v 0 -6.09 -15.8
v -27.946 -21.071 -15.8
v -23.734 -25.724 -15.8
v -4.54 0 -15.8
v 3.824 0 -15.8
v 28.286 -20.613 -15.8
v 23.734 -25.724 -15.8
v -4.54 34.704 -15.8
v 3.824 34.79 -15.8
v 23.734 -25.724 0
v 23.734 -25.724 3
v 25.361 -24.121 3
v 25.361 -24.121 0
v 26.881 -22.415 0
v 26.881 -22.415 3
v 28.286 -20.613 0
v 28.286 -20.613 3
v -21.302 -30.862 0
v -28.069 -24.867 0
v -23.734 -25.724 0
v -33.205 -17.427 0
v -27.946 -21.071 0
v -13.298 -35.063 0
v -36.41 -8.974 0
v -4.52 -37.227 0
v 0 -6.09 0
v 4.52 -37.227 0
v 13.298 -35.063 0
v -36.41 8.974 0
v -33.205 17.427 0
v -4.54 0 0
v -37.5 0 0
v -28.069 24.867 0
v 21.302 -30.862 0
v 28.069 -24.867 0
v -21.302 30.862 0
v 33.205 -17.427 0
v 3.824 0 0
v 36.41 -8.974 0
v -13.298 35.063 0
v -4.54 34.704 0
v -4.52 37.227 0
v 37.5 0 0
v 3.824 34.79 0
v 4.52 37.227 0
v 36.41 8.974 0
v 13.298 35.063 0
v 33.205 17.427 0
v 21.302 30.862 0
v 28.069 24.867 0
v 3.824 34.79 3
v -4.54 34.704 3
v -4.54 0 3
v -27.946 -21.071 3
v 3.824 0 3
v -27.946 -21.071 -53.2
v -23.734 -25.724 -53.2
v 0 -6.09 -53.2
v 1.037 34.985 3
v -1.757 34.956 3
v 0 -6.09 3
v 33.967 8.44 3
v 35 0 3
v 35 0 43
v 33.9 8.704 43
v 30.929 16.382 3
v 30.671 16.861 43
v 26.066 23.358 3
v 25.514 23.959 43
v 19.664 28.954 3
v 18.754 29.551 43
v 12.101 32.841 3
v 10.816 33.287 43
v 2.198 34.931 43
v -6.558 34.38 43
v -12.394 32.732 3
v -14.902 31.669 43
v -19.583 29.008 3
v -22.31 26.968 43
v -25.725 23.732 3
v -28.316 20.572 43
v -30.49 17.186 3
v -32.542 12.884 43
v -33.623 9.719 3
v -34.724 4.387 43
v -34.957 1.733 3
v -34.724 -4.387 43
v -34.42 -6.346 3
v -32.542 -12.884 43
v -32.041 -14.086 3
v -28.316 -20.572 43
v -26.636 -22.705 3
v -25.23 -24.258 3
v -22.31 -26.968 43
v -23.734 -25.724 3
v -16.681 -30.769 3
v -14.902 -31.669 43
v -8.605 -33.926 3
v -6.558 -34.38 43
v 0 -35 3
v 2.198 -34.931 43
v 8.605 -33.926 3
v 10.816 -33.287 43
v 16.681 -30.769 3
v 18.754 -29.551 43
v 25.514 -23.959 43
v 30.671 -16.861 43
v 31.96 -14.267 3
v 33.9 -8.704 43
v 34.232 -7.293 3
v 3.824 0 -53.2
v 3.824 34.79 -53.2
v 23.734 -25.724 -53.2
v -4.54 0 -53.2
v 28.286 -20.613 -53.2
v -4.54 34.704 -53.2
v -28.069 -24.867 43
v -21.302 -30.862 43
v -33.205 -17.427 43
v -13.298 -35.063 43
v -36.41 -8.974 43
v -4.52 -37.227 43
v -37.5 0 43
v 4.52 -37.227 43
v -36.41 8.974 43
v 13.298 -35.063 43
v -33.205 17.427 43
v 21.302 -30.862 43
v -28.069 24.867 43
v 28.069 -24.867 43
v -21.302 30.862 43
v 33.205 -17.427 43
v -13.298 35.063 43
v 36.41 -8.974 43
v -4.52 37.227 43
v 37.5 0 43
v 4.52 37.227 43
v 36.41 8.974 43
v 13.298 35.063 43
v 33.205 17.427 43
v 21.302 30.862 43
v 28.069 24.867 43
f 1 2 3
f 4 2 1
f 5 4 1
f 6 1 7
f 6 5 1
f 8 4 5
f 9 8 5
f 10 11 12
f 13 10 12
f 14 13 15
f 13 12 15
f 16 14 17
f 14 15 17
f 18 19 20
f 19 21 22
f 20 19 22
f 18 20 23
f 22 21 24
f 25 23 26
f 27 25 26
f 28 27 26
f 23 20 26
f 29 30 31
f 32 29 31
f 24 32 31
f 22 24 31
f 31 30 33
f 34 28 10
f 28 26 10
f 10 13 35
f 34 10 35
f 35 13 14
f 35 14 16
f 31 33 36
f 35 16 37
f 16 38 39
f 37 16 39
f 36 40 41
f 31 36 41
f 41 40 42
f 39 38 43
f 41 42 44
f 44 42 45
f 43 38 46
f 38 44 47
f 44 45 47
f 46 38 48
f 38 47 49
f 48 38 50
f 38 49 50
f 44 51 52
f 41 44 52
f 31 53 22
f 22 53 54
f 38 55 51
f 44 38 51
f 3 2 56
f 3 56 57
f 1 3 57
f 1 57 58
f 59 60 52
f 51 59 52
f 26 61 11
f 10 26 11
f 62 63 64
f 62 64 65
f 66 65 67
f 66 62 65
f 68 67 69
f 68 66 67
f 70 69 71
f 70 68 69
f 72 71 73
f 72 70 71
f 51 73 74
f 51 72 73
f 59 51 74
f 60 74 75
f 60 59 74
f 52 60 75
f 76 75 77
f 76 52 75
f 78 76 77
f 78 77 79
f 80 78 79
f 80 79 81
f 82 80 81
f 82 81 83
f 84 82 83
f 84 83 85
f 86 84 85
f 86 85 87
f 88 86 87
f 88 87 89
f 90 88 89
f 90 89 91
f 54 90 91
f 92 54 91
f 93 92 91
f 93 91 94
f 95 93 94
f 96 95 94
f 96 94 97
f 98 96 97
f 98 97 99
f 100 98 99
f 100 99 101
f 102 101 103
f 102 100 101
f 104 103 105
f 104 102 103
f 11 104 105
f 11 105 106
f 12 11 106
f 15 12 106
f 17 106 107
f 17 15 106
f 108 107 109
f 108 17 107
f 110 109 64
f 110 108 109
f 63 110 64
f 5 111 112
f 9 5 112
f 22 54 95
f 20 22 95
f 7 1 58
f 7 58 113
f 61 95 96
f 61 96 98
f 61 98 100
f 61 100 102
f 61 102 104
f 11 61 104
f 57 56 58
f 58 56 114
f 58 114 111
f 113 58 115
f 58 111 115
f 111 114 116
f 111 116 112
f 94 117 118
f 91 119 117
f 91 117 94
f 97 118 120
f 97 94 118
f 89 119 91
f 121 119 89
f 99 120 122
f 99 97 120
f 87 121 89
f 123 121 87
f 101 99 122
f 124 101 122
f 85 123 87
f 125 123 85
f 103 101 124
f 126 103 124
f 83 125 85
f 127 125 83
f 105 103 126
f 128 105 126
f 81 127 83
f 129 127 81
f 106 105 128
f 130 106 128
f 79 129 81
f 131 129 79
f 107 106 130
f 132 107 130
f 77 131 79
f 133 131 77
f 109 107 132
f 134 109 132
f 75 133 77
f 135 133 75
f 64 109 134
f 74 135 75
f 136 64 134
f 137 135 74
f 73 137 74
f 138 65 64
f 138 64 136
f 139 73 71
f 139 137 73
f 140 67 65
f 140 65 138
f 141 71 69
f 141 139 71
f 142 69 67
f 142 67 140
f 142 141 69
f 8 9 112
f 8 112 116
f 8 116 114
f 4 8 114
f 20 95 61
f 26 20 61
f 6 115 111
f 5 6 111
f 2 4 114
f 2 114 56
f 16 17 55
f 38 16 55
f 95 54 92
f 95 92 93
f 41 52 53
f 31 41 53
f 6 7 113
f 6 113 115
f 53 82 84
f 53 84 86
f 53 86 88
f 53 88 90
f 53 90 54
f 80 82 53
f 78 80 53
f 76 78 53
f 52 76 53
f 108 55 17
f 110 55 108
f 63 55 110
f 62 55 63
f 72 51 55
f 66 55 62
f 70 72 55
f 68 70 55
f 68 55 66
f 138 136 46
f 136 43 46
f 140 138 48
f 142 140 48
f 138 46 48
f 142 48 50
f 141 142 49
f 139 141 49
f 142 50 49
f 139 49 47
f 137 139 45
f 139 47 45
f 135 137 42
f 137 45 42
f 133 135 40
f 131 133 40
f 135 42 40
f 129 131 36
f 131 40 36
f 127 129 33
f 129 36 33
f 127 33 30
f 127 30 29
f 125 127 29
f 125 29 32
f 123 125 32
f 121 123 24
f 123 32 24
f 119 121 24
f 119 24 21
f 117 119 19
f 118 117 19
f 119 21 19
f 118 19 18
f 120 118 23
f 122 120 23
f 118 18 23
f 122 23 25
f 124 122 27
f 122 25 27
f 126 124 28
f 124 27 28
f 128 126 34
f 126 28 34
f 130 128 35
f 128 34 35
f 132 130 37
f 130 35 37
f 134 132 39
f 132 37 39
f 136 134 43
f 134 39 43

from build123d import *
from build123d import SkipClean  # not in build123d's __all__

# Parameters (mm, degrees)
F0_R     = 37.5
F1_DEPTH = 3
F2_R     = 37.5
F2_R_2   = 35
F3_DEPTH = 40
F5_DEPTH = 56.2
F6_DEPTH = 18.8


with BuildPart() as f1:
    # F0 (on Top) → F1 (new body)
    with BuildSketch(Plane.XY):
        Circle(F0_R)
    extrude(amount=F1_DEPTH)

    # F2 (on face) → F3 (join)
    with BuildSketch(Plane.XY.offset(3)):
        Circle(F2_R)
        Circle(F2_R_2, mode=Mode.SUBTRACT)
    extrude(amount=F3_DEPTH)

    # F4 (on face) → F5 (join)
    with BuildSketch(Plane.XY.offset(3)):
        Polygon((3.8241918664, 34.7904520892), (-4.540327032, 34.7042566617), (-4.540327032, 5.5238307981), (-4.540327032, 0), (-27.9463561921, -21.0713354011), (-23.733683415, -25.7237686111), (0, -6.0903779231), (23.733683415, -25.7237686111), (28.2858054869, -20.6134230043), (3.8241918664, 0), align=None)
    extrude(amount=-F5_DEPTH)

    # F4 (on face) → F6 (cut)
    with BuildSketch(Plane.XY.offset(3)):
        with BuildLine():
            ThreePointArc((23.733683415, -25.7237686111), (26.1349519697, -23.2801264073), (28.2858054869, -20.6134230043))
            Line((28.2858054869, -20.6134230043), (23.733683415, -25.7237686111))
        make_face()
        Polygon((3.8241918664, 34.7904520892), (-4.540327032, 34.7042566617), (-4.540327032, 5.5238307981), (-4.540327032, 0), (-27.9463561921, -21.0713354011), (-23.733683415, -25.7237686111), (0, -6.0903779231), (23.733683415, -25.7237686111), (28.2858054869, -20.6134230043), (3.8241918664, 0), align=None)
    with SkipClean():  # cleaning this boolean's faces spoils the solid; the shape is the same uncleaned
        extrude(amount=-F6_DEPTH, mode=Mode.SUBTRACT)


solid = f1.part
